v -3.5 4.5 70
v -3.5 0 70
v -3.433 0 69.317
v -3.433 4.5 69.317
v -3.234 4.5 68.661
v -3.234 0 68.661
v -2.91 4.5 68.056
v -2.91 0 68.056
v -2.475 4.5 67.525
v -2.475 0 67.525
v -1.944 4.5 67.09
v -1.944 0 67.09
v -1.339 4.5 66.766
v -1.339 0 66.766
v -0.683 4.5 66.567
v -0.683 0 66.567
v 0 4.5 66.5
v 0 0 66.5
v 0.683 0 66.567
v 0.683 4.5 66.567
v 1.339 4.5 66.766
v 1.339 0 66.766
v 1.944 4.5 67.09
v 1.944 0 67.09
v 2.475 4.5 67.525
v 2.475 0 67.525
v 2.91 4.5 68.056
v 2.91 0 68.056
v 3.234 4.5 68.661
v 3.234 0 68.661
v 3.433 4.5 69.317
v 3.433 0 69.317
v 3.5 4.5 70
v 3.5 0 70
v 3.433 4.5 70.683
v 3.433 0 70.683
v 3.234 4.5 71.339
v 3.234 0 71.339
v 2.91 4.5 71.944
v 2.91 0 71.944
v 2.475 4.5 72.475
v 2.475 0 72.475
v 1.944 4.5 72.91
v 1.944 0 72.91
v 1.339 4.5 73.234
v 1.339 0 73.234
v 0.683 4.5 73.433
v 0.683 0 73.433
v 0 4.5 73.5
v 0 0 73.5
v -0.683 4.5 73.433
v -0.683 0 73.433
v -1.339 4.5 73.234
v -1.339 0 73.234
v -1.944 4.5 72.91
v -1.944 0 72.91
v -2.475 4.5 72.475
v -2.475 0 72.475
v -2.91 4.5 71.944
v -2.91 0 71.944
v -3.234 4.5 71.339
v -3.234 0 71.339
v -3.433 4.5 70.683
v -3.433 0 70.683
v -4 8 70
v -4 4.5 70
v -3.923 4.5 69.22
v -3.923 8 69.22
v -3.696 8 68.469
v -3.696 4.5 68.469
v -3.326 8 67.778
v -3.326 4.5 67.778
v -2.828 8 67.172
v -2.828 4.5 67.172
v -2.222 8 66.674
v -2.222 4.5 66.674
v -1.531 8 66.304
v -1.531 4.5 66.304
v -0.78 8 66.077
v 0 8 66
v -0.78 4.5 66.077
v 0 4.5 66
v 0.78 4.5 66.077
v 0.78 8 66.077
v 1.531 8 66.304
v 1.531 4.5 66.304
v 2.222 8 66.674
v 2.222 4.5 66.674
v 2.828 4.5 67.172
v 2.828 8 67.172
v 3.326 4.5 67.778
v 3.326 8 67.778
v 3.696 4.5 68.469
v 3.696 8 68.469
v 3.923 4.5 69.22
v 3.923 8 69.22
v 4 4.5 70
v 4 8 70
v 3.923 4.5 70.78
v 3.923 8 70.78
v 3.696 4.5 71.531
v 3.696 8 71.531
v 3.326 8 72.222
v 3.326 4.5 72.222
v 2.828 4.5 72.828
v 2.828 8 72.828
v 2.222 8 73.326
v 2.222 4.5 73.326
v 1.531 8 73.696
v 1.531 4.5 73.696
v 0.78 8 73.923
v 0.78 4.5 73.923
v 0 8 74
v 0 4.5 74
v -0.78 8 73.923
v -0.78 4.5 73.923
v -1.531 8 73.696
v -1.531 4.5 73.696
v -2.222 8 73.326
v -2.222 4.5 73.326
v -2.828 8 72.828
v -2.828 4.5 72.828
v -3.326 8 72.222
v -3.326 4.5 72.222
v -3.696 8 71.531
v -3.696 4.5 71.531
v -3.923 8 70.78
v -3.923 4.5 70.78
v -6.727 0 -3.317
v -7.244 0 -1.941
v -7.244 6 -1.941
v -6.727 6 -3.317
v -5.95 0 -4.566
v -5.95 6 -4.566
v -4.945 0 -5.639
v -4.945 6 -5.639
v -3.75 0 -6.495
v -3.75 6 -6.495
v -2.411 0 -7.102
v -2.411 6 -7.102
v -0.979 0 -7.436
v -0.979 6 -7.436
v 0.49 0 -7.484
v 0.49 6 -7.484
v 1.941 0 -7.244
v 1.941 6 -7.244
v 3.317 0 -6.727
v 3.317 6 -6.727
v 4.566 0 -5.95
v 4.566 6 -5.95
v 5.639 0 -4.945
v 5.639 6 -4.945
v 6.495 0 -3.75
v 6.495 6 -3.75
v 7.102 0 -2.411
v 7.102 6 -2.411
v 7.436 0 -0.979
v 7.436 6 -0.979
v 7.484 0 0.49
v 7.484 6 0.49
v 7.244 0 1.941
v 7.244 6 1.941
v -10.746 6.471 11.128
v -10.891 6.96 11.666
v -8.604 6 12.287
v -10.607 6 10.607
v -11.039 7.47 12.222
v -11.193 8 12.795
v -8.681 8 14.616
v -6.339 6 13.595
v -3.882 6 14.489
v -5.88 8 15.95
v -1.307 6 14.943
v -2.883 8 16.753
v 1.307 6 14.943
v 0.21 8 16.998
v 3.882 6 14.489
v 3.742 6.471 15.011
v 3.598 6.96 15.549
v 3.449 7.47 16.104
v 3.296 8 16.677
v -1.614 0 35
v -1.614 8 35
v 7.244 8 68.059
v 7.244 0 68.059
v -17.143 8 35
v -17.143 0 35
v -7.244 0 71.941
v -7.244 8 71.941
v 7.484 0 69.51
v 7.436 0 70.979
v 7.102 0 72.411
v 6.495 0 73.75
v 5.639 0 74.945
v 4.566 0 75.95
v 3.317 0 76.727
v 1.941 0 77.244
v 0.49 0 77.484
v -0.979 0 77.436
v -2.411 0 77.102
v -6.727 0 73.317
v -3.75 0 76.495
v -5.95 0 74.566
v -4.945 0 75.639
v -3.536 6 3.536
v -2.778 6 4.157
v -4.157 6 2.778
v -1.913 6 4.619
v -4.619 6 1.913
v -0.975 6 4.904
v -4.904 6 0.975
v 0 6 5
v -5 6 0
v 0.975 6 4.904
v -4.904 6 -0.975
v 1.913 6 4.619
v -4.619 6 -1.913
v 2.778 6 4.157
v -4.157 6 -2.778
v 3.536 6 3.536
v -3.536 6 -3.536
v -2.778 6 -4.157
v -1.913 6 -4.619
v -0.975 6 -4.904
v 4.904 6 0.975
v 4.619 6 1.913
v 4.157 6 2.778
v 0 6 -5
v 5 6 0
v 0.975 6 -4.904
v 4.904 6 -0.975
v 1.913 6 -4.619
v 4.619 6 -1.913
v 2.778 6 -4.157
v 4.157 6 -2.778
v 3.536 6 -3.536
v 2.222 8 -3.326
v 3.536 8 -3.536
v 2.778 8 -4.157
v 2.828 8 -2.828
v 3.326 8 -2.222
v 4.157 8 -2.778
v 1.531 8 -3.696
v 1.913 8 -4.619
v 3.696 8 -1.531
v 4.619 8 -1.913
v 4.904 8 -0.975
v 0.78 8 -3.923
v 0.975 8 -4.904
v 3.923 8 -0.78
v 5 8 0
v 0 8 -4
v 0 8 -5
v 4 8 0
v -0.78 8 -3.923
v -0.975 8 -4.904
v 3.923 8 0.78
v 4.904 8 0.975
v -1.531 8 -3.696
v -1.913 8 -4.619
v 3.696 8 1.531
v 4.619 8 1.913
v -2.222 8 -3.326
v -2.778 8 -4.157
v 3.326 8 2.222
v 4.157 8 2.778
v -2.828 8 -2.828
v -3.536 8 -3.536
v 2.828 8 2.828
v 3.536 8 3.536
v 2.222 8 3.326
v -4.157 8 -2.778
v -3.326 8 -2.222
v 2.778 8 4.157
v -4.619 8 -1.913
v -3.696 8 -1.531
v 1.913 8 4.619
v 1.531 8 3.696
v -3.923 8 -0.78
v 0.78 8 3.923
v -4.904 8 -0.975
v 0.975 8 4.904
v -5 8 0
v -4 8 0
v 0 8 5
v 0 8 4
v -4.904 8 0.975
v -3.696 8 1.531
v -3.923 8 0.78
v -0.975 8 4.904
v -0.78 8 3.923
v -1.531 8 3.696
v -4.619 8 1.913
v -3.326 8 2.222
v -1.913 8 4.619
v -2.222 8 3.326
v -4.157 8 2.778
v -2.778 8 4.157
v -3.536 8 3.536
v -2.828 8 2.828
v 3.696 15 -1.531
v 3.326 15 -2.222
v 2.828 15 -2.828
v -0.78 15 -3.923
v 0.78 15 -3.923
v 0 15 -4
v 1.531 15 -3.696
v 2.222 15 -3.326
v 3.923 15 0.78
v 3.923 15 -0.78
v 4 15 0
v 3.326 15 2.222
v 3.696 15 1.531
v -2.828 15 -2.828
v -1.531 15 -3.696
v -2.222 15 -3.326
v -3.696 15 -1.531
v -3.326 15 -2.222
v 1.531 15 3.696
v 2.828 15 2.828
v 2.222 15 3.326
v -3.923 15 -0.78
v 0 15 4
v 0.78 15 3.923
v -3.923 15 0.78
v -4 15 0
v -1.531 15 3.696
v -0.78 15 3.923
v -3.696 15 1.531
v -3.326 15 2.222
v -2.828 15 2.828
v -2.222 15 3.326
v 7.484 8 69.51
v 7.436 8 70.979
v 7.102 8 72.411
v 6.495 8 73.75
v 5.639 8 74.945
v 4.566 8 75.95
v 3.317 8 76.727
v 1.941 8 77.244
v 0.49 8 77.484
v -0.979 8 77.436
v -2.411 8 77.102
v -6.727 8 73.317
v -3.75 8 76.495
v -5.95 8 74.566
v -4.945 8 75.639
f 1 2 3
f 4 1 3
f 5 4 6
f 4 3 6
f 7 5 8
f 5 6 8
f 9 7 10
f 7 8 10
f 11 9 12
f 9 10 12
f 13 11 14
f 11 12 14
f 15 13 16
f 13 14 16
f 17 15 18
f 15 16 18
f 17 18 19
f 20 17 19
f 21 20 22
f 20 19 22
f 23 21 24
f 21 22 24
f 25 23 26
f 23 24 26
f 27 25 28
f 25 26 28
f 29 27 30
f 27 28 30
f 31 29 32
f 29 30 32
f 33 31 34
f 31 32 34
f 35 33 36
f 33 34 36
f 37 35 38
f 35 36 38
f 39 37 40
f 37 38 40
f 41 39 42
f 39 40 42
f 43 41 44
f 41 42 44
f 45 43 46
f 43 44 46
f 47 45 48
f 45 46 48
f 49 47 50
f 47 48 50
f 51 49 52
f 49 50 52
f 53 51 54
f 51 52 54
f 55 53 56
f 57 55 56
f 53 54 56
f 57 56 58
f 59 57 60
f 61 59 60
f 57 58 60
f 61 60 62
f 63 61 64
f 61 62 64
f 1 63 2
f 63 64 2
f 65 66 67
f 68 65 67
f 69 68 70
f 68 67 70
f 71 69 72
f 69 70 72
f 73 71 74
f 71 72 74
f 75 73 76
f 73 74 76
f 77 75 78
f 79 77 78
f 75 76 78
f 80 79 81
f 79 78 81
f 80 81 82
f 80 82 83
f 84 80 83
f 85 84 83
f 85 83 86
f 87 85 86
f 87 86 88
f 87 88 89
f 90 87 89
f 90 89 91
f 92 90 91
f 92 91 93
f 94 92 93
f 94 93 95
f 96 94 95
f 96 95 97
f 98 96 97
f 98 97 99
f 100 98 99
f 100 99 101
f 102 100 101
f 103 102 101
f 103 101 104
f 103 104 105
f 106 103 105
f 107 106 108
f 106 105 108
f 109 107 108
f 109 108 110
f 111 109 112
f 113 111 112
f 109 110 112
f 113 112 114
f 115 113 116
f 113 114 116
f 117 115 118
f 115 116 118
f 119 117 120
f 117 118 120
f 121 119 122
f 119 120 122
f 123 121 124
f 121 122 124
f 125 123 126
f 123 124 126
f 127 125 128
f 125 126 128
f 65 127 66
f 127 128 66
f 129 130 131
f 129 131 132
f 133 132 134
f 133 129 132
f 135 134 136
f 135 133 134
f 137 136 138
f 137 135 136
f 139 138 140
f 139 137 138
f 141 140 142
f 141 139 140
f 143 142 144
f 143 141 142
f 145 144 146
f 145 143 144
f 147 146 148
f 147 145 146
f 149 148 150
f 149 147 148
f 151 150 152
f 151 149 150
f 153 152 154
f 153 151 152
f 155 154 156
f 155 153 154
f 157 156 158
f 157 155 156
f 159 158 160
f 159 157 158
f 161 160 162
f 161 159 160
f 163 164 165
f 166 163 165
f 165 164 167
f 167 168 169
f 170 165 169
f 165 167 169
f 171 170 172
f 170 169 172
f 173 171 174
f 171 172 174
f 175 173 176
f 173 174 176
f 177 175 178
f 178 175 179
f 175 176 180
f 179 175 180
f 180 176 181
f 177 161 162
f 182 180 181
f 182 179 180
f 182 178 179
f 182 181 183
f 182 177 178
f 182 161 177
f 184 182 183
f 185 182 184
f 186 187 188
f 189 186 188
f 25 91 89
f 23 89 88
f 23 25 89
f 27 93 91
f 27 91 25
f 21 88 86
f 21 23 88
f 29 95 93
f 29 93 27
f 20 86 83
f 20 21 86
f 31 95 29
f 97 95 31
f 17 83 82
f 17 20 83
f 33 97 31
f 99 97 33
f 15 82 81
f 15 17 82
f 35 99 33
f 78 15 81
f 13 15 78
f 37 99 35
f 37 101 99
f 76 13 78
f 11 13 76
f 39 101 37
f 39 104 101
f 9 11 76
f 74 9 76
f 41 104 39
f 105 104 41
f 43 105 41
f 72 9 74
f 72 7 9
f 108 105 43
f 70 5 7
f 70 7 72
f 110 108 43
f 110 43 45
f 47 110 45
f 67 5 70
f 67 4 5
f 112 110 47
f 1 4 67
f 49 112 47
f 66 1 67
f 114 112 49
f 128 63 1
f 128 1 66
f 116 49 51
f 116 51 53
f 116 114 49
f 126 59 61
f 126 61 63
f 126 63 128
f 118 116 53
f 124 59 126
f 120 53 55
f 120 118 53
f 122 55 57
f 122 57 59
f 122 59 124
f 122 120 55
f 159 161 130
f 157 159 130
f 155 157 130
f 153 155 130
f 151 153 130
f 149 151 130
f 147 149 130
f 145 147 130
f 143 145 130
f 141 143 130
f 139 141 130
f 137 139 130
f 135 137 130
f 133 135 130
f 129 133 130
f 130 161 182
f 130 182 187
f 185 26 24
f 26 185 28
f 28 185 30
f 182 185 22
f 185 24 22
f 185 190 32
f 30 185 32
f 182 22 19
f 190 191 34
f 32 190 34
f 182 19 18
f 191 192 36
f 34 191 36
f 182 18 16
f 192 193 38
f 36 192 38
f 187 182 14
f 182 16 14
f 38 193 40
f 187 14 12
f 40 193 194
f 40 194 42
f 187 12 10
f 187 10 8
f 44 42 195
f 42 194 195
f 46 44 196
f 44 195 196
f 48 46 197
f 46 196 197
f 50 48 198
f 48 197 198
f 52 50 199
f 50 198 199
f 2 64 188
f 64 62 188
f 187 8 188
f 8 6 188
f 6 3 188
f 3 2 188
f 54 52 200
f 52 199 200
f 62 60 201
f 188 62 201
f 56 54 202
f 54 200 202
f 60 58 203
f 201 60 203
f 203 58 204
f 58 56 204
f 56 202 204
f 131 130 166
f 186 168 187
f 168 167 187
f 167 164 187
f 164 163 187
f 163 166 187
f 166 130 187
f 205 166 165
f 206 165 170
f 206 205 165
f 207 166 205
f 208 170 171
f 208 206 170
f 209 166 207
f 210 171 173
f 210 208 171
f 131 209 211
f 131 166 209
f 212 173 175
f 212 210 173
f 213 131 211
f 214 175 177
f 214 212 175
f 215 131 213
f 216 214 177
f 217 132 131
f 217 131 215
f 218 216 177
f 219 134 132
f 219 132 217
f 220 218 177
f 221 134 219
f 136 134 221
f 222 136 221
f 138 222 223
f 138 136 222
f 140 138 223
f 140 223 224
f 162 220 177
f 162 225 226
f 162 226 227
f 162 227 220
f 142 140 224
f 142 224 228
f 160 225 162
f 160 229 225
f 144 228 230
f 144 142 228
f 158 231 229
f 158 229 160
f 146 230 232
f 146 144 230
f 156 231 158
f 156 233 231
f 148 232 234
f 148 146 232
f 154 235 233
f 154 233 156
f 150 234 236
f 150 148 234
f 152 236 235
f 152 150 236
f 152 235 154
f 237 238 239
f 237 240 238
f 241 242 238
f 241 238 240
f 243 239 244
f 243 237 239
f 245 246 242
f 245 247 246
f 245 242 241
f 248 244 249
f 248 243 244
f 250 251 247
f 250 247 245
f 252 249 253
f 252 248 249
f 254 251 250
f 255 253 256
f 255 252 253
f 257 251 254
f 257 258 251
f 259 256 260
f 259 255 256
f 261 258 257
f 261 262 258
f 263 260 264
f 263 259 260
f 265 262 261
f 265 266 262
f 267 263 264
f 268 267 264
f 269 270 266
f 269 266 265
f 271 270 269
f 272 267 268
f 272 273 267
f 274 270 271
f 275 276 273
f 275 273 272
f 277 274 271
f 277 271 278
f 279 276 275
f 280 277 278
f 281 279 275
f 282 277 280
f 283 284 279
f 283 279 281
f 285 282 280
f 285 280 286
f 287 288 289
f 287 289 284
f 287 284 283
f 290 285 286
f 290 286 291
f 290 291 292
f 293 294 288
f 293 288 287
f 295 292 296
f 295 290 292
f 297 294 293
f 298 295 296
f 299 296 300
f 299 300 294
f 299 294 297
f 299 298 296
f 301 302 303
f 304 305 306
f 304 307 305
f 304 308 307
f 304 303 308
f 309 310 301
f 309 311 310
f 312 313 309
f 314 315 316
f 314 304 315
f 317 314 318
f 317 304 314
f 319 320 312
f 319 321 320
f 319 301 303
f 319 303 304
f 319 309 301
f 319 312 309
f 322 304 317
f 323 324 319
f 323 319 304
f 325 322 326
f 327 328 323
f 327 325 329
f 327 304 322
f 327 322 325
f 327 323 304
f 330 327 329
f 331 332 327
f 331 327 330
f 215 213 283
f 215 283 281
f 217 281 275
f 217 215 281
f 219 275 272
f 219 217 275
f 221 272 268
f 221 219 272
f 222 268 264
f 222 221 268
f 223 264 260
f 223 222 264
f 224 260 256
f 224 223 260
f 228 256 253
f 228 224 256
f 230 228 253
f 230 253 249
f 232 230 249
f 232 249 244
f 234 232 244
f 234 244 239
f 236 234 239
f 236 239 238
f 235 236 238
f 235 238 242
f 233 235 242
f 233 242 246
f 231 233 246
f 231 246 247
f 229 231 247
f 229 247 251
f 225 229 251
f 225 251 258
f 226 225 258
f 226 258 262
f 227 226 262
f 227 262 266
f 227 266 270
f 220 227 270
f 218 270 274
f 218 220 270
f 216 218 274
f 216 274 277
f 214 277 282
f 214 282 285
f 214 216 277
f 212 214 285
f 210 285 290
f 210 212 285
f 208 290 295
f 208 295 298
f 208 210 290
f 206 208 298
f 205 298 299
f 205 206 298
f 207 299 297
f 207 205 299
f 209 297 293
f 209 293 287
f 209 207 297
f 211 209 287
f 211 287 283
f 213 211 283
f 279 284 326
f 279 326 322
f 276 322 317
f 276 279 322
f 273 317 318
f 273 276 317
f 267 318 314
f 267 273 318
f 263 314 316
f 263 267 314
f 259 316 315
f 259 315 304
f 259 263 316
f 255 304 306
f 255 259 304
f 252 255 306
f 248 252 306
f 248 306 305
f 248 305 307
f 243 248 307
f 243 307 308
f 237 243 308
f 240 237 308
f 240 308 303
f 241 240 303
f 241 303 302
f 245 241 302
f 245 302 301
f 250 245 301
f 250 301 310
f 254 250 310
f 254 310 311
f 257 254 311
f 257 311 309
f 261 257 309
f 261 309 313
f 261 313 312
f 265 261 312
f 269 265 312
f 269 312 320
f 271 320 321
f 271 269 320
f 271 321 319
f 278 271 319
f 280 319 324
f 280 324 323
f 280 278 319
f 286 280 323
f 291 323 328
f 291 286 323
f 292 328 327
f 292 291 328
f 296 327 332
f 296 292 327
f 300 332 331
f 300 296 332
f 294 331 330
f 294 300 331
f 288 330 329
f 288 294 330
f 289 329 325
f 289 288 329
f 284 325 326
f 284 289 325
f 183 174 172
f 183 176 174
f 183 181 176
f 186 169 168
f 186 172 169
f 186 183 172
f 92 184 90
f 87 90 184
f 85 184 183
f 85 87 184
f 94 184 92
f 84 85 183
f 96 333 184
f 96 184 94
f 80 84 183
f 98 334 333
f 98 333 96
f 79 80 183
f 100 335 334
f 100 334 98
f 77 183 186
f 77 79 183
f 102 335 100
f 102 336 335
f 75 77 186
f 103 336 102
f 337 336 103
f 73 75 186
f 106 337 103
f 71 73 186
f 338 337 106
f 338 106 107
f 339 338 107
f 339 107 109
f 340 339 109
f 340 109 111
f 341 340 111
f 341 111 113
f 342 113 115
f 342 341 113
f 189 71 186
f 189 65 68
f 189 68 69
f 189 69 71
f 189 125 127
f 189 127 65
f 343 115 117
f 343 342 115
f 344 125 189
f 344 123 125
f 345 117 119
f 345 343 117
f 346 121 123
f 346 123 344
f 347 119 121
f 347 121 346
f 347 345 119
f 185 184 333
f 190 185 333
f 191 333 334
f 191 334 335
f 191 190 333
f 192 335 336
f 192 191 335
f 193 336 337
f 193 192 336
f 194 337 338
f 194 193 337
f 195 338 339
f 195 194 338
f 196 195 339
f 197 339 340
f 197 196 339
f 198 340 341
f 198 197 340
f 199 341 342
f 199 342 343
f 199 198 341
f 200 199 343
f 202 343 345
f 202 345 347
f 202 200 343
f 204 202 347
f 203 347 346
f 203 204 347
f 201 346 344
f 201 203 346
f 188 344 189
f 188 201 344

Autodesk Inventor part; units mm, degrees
ref_plane "YZ Plane" through (0, 0, 0) normal (1, 0, 0) x (0, 1, 0)
ref_plane "XZ Plane" through (0, 0, 0) normal (0, 1, 0) x (-1, 0, 0)
ref_plane "XY Plane" through (0, 0, 0) normal (0, 0, 1) x (1, 0, 0)
sketch "Sketch3" plane through (0, 0, 0) normal (0, 1, 0) x (-1, 0, 0)
  circle A0 centre (0, 0) radius 4
  circle A1 centre (0, 0) radius 5
  circle A2 centre (0, 0) radius 7.5
  line L0 (0, -24.5) -> (0, 94.5) projected
  line L1 (22.0714, 0) -> (-12.4286, 0) projected
  circle A3 centre (0, 70) radius 4
  line L2 (7.2444, -1.9411) -> (17.1428, 35)
  line L3 (17.1428, 35) -> (7.2444, 71.9411)
  circle A4 centre (0, 70) radius 7.5
  line L4 (-7.2444, 1.9411) -> (1.6137, 35)
  line L5 (1.6137, 35) -> (-7.2444, 68.0589)
  circle A5 centre (0, 70) radius 3.5
  dimension "d15" = 8
  dimension "d16" = 10
  dimension "d17" = 15
  dimension "d18" = 8
  dimension "d19" = 70
  dimension "d20" = 15
  dimension "d21" = 35
  dimension "d24" = 15
  dimension "d25" = 35
  dimension "d43" = 7
extrude "Extrusion4" add sketch "Sketch3" along normal blind 8 contours L1 L2 A2 | A2 L0 L4 L5 A4 L3 L2 L1 | A2 L4 L0 | L5 A4 L0
extrude "Extrusion5" add sketch "Sketch3" along normal blind 8 contours L1 A2 L0 A1 | A1 L0 A2 L1 | A1 L1 A2 L0 | L0 A2 L1 A1
sketch "Sketch4" plane through (0, 8, 0) normal (0, 1, 0) x (1, 0, 0)
  circle A0 centre (0, 0) radius 15
  circle A1 centre (0, 0) radius 13.25
  dimension "d30" = 30
  dimension "d31" = 26.5
extrude "Extrusion6" cut sketch "Sketch4" against normal blind 2 contours A0 | A1
extrude "Extrusion7" add sketch "Sketch3" along normal blind 15 contours L1 L0 A0 | A0 L0 L1 | L0 L1 A0 | A0 L1 L0
extrude "Extrusion8" add sketch "Sketch3" along normal blind 8 contours L1 A1 L0 A0 | A0 L0 A1 L1 | A0 L1 A1 L0 | L0 A1 L1 A0
chamfer "Chamfer1" distance 2 angle 45 1 edges at (-3.8823, 8, 14.4889)
extrude "Extrusion9" add sketch "Sketch3" along normal blind 8 contours A4 L0 A3 | A4 L0 A3
extrude "Extrusion10" add sketch "Sketch3" along normal blind 4.5 contours A3 L0 A5 | L0 A5 A3
properties part number "side arm"
